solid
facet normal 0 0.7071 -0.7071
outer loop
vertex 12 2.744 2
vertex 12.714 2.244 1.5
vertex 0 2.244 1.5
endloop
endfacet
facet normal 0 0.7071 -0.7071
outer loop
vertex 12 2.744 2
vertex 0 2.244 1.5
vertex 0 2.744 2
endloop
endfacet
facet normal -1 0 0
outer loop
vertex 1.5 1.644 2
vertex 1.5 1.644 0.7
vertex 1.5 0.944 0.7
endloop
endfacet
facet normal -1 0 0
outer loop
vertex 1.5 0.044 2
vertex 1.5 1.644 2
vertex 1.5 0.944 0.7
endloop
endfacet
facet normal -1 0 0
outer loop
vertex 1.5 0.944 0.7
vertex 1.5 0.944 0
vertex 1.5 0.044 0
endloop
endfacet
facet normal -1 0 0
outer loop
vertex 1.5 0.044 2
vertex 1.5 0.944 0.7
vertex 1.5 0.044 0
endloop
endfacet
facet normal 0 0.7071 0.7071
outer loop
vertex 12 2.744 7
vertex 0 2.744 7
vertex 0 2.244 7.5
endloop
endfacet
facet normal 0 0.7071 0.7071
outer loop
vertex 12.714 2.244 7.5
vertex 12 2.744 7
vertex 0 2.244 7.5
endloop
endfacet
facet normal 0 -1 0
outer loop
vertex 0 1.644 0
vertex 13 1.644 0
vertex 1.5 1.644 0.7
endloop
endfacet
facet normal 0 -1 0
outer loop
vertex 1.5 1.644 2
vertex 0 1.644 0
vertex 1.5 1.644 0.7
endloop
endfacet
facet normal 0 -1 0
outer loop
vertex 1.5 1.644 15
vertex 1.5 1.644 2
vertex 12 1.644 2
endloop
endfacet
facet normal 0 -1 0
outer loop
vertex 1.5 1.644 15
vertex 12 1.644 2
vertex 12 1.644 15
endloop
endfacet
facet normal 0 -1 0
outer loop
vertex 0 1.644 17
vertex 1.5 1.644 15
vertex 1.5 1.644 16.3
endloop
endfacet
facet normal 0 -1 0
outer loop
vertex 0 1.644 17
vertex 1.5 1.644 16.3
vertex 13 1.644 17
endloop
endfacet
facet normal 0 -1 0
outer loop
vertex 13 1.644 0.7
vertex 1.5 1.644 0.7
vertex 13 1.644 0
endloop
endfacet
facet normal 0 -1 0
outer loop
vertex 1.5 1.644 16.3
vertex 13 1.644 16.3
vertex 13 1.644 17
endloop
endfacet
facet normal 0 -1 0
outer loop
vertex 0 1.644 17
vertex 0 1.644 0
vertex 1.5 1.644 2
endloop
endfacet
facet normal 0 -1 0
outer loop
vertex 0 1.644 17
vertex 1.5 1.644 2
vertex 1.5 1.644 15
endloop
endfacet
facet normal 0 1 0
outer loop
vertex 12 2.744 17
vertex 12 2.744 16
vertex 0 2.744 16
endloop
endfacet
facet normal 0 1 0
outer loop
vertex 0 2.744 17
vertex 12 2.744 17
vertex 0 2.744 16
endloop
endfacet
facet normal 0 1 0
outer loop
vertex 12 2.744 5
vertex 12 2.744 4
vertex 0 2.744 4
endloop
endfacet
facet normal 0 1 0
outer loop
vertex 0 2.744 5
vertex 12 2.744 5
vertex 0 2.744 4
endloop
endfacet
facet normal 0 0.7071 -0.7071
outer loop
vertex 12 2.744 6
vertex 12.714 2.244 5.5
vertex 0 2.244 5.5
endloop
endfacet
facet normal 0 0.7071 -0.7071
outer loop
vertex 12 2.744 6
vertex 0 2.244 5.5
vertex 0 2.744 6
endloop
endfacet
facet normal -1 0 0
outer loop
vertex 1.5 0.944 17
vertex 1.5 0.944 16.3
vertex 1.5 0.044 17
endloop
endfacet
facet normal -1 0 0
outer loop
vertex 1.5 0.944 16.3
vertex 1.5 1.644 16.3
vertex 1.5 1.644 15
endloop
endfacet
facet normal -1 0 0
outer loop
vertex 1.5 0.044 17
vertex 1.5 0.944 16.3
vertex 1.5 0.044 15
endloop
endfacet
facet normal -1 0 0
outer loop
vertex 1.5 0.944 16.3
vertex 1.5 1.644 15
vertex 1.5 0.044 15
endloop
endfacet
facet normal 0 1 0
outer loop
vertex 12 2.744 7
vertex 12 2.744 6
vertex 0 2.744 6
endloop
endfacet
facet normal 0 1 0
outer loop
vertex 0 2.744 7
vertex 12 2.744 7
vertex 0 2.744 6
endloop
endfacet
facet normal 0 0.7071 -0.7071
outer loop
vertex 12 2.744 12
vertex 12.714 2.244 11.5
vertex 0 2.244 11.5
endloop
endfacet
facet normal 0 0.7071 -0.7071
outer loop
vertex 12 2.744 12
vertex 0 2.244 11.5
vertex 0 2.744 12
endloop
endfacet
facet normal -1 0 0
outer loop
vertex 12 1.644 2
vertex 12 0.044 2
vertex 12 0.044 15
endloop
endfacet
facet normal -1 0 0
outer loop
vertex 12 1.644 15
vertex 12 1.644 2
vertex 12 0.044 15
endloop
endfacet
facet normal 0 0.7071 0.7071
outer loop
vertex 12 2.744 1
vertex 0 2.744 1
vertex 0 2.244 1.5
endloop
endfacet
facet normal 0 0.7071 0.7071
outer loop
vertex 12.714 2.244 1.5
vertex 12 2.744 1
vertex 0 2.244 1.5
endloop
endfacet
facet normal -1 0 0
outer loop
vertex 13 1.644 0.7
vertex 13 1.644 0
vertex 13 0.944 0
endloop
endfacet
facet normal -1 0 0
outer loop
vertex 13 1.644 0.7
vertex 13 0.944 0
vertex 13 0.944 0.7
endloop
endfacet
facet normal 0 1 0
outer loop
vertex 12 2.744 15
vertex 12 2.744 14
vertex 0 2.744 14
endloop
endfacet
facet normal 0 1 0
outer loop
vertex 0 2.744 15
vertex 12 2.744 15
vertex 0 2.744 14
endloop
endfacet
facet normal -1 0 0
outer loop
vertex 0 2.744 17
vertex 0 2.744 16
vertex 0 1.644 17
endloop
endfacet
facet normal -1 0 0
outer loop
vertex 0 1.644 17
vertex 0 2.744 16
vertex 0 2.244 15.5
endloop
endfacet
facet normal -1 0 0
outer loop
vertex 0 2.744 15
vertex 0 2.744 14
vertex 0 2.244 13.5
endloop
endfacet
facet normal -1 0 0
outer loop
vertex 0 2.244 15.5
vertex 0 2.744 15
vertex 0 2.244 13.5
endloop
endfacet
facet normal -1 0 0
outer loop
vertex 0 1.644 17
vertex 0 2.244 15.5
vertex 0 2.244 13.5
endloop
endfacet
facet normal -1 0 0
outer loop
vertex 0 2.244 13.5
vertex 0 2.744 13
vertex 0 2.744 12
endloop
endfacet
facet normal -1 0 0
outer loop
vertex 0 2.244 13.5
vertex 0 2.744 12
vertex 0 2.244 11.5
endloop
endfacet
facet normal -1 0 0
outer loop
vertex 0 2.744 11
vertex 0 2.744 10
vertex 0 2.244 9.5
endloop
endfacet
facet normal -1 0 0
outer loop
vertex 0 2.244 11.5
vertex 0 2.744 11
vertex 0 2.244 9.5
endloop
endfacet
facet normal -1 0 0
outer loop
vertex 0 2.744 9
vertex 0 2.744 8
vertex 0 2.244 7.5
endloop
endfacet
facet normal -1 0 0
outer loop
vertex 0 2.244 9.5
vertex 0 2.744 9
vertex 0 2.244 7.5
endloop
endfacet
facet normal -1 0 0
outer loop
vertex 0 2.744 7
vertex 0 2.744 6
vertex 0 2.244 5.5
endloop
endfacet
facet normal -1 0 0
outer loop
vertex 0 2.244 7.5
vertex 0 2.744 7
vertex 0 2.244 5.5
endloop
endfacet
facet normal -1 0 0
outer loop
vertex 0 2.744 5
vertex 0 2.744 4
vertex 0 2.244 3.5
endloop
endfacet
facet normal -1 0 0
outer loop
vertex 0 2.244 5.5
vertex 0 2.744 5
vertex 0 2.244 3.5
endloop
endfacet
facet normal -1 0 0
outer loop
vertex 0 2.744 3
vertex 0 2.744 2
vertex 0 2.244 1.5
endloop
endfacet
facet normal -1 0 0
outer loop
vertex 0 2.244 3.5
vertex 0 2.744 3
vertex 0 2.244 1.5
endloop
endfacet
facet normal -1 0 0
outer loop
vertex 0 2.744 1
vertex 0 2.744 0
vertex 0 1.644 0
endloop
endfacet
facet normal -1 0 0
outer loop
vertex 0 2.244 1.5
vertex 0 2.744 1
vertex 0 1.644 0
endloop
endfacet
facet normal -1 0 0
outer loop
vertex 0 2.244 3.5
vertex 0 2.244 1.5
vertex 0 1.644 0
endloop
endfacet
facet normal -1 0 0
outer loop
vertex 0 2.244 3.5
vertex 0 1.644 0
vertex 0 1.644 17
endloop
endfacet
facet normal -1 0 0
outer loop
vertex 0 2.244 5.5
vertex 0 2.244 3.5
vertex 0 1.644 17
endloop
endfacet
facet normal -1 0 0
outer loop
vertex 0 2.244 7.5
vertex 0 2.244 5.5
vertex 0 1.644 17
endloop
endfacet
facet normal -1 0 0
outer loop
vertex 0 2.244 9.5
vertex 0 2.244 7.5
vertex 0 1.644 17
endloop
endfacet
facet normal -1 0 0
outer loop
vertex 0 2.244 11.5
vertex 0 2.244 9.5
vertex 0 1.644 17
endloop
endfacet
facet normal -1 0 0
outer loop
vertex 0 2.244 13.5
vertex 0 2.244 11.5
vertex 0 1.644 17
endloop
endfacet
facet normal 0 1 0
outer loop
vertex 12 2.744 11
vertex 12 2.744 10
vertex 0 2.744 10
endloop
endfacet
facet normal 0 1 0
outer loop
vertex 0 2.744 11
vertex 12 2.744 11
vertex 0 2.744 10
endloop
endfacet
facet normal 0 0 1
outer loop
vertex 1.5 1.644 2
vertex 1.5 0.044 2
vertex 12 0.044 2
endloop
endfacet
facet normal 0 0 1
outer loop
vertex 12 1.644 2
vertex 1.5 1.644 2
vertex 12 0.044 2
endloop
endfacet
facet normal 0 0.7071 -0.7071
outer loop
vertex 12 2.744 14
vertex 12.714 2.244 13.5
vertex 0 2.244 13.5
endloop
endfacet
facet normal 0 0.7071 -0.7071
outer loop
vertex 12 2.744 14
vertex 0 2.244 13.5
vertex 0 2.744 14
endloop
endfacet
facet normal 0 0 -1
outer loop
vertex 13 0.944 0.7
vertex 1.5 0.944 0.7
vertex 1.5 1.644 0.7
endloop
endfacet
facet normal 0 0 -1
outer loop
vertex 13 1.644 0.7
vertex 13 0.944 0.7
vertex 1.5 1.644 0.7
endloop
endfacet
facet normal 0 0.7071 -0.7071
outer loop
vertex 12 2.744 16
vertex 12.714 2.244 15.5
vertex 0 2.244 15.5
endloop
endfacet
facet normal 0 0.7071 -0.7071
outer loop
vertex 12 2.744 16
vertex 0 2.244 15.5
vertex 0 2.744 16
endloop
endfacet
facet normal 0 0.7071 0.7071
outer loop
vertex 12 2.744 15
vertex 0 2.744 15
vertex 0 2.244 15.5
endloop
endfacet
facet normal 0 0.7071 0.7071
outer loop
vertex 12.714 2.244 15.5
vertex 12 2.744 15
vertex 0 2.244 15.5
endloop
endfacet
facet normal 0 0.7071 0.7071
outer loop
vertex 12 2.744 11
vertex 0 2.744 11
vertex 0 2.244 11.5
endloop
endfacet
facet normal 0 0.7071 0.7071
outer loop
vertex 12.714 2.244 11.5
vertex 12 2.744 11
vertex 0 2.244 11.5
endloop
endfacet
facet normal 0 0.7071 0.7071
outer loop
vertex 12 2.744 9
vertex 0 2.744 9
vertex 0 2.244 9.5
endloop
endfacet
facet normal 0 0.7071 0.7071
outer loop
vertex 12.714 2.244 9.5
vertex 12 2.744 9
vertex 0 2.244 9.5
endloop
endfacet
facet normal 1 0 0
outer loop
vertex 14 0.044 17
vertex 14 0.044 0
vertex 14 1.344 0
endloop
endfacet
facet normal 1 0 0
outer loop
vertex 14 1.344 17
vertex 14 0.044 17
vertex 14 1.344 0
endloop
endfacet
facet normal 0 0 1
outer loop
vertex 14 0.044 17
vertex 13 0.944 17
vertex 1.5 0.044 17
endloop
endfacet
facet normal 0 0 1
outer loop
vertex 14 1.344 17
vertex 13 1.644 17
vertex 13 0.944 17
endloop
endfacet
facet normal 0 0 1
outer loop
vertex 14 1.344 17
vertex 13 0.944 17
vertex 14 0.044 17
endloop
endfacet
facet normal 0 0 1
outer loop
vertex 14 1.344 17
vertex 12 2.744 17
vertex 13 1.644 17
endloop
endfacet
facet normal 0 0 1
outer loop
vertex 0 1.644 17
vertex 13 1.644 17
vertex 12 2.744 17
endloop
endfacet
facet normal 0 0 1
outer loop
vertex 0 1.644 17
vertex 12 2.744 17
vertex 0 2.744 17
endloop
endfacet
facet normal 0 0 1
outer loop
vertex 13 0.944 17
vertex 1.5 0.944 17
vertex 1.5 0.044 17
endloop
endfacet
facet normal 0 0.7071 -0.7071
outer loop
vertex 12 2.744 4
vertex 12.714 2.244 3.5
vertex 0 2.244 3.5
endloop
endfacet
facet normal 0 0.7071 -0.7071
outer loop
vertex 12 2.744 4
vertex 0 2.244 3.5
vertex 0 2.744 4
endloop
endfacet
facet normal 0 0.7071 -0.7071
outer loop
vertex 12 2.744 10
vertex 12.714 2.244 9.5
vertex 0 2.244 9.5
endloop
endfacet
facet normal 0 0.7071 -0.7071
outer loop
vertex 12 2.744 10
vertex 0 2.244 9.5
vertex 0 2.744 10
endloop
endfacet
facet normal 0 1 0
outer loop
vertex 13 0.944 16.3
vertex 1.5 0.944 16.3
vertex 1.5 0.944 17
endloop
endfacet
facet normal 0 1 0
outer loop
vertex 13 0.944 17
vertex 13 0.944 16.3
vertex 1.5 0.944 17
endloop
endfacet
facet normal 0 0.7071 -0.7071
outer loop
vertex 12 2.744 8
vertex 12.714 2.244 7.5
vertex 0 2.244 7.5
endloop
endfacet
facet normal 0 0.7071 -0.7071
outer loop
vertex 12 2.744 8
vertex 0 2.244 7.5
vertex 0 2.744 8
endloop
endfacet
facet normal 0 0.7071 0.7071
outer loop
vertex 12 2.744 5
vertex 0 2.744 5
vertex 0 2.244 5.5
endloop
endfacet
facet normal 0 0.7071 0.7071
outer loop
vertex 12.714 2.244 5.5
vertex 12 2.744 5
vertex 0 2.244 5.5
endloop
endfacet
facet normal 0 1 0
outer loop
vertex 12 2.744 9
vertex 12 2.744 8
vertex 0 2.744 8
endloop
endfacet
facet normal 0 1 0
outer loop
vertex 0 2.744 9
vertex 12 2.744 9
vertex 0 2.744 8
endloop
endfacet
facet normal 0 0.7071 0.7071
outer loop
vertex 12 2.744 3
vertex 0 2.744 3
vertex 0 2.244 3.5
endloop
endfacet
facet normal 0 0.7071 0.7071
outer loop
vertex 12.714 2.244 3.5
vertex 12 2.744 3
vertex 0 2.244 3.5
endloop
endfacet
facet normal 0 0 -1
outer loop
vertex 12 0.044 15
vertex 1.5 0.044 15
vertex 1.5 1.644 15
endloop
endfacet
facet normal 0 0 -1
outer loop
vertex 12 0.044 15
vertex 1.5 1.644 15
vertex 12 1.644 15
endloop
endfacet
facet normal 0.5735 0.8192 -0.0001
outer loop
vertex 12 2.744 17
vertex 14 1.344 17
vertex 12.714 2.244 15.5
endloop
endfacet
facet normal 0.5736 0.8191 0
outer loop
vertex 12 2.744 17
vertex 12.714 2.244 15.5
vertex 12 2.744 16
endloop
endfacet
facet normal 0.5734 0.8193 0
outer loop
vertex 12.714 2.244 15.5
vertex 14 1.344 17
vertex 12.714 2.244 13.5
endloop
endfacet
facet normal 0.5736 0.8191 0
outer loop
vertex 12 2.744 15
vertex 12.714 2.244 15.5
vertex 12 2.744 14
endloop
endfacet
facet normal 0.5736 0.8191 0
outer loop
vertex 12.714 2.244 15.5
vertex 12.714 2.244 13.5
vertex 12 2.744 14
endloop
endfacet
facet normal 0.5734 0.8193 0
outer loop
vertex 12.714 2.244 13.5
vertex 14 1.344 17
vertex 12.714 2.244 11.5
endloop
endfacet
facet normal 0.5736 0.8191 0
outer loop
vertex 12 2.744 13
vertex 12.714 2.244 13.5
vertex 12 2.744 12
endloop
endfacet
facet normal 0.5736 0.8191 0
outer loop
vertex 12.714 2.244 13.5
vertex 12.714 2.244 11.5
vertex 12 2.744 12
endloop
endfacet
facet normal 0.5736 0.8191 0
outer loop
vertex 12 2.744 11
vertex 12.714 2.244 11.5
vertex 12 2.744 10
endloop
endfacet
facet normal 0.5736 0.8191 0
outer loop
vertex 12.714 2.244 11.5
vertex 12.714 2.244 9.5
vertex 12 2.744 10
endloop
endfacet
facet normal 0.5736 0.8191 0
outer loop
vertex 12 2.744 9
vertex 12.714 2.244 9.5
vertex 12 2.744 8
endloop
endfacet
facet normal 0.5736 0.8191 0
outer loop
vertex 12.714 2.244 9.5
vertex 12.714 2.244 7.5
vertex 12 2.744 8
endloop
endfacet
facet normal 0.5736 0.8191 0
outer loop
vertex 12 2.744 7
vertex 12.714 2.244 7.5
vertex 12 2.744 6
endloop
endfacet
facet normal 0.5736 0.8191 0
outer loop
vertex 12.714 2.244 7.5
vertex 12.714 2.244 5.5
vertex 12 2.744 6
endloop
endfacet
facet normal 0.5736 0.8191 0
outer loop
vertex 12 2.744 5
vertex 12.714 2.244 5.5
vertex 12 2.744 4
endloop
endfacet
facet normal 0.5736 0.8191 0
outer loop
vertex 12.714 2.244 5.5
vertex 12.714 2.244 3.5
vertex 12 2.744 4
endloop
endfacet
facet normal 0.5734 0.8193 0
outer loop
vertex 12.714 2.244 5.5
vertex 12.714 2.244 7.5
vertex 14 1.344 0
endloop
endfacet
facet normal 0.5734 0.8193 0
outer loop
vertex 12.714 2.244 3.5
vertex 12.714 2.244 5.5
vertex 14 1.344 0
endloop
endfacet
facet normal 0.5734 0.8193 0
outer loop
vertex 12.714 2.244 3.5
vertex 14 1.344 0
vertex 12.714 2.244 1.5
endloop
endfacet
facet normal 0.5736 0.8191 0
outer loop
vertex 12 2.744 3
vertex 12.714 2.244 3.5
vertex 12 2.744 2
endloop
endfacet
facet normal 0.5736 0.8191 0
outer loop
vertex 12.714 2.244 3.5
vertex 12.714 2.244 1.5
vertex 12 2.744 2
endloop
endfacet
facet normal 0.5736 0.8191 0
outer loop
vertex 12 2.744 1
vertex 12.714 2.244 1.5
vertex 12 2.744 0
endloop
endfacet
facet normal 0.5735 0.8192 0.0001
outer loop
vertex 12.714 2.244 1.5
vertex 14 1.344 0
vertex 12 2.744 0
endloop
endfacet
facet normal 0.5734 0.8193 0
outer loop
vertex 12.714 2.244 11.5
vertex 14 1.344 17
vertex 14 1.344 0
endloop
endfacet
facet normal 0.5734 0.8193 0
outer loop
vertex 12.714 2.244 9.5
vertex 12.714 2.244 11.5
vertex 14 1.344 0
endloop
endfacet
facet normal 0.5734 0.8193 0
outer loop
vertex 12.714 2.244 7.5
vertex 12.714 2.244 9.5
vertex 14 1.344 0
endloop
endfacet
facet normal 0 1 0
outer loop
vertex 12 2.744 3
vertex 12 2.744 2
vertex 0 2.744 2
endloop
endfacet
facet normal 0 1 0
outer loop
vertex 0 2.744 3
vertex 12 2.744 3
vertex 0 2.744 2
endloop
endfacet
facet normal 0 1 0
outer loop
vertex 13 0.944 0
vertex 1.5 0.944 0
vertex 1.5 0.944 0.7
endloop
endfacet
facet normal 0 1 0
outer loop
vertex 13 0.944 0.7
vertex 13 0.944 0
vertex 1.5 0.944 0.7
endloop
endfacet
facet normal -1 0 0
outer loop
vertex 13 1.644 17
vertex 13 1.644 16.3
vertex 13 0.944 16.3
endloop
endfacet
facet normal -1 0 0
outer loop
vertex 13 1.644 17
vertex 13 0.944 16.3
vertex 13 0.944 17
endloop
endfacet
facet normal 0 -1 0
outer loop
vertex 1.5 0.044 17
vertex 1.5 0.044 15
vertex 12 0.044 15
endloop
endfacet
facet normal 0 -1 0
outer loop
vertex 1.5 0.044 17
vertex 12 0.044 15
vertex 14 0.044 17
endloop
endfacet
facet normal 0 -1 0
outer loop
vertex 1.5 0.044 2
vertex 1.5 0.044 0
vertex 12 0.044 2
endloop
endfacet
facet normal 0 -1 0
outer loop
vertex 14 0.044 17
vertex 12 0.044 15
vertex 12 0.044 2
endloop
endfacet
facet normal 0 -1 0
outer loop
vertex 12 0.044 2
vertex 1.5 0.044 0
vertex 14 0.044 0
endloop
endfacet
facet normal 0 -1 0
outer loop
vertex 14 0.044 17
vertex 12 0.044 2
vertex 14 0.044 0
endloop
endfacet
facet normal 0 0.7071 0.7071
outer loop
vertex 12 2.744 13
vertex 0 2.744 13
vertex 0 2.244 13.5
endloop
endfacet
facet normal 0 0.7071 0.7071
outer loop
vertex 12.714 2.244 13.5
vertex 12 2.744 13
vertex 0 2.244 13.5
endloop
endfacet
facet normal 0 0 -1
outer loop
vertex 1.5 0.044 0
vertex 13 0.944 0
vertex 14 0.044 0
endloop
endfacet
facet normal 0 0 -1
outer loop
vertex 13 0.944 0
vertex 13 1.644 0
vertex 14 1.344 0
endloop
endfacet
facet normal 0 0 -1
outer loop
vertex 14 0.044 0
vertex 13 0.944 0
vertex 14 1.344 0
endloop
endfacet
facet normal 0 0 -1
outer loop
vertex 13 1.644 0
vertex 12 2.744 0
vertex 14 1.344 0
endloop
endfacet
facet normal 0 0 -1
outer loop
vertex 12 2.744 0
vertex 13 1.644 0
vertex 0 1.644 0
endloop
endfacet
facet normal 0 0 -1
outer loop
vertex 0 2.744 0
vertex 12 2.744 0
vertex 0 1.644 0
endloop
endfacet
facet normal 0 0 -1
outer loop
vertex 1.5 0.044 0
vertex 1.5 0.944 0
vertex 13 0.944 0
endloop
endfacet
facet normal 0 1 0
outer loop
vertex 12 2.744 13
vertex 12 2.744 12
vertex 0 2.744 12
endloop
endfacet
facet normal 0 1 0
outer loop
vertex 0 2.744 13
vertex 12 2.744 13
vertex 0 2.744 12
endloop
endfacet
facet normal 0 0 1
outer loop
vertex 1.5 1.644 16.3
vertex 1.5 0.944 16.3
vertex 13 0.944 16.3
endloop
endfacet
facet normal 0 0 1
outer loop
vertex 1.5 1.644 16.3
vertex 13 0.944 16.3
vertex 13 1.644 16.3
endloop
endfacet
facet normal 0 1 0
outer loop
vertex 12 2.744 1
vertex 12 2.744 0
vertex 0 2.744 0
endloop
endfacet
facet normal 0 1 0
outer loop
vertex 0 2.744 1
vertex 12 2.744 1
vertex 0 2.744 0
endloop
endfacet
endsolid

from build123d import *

# Parameters (mm, degrees)
EXTRUDE_1_DEPTH     = 17
SKETCH_4_W          = 10.5
SKETCH_4_H          = 13
CUT_EXTRUDE_1_DEPTH = 1.6
SKETCH_5_W          = 0.7
SKETCH_5_H          = 0.7
CUT_EXTRUDE_2_DEPTH = 13


with BuildPart() as part:
    # 草图1 → 凸台-拉伸1 (new body)
    with BuildSketch(Plane.XY):
        Polygon((1.5, 0.044381888), (14, 0.044381888), (14, 1.344381888), (12, 2.744381888), (0, 2.744381888), (0, 1.644381888), (1.5, 1.644381888), align=None)
    extrude(amount=EXTRUDE_1_DEPTH)

    # 草图4 → 切除-拉伸1 (cut)
    with BuildSketch(Plane.XZ.offset(-0.044381888)):
        with Locations((6.75, 8.5)):
            Rectangle(SKETCH_4_W, SKETCH_4_H)
    extrude(amount=-CUT_EXTRUDE_1_DEPTH, mode=Mode.SUBTRACT)

    # 草图5 → 切除-拉伸2 (cut)
    with BuildSketch(Plane.ZY):
        with Locations((0.35, 1.294381888)):
            Rectangle(SKETCH_5_W, SKETCH_5_H)
        Polygon((0, 2.744381888), (1, 2.744381888), (1.5, 2.244381888), (2, 2.744381888), (3, 2.744381888), (3.5, 2.244381888), (4, 2.744381888), (5, 2.744381888), (5.5, 2.244381888), (6, 2.744381888), (7, 2.744381888), (7.5, 2.244381888), (8, 2.744381888), (9, 2.744381888), (9.5, 2.244381888), (10, 2.744381888), (11, 2.744381888), (11.5, 2.244381888), (12, 2.744381888), (13, 2.744381888), (13.5, 2.244381888), (14, 2.744381888), (15, 2.744381888), (15.5, 2.244381888), (16, 2.744381888), (17, 2.744381888), (17, 3.744381888), (0, 3.744381888), align=None)
        with Locations((16.65, 1.294381888)):
            Rectangle(SKETCH_5_W, SKETCH_5_H)
    extrude(amount=-CUT_EXTRUDE_2_DEPTH, mode=Mode.SUBTRACT)


solid = part.part
